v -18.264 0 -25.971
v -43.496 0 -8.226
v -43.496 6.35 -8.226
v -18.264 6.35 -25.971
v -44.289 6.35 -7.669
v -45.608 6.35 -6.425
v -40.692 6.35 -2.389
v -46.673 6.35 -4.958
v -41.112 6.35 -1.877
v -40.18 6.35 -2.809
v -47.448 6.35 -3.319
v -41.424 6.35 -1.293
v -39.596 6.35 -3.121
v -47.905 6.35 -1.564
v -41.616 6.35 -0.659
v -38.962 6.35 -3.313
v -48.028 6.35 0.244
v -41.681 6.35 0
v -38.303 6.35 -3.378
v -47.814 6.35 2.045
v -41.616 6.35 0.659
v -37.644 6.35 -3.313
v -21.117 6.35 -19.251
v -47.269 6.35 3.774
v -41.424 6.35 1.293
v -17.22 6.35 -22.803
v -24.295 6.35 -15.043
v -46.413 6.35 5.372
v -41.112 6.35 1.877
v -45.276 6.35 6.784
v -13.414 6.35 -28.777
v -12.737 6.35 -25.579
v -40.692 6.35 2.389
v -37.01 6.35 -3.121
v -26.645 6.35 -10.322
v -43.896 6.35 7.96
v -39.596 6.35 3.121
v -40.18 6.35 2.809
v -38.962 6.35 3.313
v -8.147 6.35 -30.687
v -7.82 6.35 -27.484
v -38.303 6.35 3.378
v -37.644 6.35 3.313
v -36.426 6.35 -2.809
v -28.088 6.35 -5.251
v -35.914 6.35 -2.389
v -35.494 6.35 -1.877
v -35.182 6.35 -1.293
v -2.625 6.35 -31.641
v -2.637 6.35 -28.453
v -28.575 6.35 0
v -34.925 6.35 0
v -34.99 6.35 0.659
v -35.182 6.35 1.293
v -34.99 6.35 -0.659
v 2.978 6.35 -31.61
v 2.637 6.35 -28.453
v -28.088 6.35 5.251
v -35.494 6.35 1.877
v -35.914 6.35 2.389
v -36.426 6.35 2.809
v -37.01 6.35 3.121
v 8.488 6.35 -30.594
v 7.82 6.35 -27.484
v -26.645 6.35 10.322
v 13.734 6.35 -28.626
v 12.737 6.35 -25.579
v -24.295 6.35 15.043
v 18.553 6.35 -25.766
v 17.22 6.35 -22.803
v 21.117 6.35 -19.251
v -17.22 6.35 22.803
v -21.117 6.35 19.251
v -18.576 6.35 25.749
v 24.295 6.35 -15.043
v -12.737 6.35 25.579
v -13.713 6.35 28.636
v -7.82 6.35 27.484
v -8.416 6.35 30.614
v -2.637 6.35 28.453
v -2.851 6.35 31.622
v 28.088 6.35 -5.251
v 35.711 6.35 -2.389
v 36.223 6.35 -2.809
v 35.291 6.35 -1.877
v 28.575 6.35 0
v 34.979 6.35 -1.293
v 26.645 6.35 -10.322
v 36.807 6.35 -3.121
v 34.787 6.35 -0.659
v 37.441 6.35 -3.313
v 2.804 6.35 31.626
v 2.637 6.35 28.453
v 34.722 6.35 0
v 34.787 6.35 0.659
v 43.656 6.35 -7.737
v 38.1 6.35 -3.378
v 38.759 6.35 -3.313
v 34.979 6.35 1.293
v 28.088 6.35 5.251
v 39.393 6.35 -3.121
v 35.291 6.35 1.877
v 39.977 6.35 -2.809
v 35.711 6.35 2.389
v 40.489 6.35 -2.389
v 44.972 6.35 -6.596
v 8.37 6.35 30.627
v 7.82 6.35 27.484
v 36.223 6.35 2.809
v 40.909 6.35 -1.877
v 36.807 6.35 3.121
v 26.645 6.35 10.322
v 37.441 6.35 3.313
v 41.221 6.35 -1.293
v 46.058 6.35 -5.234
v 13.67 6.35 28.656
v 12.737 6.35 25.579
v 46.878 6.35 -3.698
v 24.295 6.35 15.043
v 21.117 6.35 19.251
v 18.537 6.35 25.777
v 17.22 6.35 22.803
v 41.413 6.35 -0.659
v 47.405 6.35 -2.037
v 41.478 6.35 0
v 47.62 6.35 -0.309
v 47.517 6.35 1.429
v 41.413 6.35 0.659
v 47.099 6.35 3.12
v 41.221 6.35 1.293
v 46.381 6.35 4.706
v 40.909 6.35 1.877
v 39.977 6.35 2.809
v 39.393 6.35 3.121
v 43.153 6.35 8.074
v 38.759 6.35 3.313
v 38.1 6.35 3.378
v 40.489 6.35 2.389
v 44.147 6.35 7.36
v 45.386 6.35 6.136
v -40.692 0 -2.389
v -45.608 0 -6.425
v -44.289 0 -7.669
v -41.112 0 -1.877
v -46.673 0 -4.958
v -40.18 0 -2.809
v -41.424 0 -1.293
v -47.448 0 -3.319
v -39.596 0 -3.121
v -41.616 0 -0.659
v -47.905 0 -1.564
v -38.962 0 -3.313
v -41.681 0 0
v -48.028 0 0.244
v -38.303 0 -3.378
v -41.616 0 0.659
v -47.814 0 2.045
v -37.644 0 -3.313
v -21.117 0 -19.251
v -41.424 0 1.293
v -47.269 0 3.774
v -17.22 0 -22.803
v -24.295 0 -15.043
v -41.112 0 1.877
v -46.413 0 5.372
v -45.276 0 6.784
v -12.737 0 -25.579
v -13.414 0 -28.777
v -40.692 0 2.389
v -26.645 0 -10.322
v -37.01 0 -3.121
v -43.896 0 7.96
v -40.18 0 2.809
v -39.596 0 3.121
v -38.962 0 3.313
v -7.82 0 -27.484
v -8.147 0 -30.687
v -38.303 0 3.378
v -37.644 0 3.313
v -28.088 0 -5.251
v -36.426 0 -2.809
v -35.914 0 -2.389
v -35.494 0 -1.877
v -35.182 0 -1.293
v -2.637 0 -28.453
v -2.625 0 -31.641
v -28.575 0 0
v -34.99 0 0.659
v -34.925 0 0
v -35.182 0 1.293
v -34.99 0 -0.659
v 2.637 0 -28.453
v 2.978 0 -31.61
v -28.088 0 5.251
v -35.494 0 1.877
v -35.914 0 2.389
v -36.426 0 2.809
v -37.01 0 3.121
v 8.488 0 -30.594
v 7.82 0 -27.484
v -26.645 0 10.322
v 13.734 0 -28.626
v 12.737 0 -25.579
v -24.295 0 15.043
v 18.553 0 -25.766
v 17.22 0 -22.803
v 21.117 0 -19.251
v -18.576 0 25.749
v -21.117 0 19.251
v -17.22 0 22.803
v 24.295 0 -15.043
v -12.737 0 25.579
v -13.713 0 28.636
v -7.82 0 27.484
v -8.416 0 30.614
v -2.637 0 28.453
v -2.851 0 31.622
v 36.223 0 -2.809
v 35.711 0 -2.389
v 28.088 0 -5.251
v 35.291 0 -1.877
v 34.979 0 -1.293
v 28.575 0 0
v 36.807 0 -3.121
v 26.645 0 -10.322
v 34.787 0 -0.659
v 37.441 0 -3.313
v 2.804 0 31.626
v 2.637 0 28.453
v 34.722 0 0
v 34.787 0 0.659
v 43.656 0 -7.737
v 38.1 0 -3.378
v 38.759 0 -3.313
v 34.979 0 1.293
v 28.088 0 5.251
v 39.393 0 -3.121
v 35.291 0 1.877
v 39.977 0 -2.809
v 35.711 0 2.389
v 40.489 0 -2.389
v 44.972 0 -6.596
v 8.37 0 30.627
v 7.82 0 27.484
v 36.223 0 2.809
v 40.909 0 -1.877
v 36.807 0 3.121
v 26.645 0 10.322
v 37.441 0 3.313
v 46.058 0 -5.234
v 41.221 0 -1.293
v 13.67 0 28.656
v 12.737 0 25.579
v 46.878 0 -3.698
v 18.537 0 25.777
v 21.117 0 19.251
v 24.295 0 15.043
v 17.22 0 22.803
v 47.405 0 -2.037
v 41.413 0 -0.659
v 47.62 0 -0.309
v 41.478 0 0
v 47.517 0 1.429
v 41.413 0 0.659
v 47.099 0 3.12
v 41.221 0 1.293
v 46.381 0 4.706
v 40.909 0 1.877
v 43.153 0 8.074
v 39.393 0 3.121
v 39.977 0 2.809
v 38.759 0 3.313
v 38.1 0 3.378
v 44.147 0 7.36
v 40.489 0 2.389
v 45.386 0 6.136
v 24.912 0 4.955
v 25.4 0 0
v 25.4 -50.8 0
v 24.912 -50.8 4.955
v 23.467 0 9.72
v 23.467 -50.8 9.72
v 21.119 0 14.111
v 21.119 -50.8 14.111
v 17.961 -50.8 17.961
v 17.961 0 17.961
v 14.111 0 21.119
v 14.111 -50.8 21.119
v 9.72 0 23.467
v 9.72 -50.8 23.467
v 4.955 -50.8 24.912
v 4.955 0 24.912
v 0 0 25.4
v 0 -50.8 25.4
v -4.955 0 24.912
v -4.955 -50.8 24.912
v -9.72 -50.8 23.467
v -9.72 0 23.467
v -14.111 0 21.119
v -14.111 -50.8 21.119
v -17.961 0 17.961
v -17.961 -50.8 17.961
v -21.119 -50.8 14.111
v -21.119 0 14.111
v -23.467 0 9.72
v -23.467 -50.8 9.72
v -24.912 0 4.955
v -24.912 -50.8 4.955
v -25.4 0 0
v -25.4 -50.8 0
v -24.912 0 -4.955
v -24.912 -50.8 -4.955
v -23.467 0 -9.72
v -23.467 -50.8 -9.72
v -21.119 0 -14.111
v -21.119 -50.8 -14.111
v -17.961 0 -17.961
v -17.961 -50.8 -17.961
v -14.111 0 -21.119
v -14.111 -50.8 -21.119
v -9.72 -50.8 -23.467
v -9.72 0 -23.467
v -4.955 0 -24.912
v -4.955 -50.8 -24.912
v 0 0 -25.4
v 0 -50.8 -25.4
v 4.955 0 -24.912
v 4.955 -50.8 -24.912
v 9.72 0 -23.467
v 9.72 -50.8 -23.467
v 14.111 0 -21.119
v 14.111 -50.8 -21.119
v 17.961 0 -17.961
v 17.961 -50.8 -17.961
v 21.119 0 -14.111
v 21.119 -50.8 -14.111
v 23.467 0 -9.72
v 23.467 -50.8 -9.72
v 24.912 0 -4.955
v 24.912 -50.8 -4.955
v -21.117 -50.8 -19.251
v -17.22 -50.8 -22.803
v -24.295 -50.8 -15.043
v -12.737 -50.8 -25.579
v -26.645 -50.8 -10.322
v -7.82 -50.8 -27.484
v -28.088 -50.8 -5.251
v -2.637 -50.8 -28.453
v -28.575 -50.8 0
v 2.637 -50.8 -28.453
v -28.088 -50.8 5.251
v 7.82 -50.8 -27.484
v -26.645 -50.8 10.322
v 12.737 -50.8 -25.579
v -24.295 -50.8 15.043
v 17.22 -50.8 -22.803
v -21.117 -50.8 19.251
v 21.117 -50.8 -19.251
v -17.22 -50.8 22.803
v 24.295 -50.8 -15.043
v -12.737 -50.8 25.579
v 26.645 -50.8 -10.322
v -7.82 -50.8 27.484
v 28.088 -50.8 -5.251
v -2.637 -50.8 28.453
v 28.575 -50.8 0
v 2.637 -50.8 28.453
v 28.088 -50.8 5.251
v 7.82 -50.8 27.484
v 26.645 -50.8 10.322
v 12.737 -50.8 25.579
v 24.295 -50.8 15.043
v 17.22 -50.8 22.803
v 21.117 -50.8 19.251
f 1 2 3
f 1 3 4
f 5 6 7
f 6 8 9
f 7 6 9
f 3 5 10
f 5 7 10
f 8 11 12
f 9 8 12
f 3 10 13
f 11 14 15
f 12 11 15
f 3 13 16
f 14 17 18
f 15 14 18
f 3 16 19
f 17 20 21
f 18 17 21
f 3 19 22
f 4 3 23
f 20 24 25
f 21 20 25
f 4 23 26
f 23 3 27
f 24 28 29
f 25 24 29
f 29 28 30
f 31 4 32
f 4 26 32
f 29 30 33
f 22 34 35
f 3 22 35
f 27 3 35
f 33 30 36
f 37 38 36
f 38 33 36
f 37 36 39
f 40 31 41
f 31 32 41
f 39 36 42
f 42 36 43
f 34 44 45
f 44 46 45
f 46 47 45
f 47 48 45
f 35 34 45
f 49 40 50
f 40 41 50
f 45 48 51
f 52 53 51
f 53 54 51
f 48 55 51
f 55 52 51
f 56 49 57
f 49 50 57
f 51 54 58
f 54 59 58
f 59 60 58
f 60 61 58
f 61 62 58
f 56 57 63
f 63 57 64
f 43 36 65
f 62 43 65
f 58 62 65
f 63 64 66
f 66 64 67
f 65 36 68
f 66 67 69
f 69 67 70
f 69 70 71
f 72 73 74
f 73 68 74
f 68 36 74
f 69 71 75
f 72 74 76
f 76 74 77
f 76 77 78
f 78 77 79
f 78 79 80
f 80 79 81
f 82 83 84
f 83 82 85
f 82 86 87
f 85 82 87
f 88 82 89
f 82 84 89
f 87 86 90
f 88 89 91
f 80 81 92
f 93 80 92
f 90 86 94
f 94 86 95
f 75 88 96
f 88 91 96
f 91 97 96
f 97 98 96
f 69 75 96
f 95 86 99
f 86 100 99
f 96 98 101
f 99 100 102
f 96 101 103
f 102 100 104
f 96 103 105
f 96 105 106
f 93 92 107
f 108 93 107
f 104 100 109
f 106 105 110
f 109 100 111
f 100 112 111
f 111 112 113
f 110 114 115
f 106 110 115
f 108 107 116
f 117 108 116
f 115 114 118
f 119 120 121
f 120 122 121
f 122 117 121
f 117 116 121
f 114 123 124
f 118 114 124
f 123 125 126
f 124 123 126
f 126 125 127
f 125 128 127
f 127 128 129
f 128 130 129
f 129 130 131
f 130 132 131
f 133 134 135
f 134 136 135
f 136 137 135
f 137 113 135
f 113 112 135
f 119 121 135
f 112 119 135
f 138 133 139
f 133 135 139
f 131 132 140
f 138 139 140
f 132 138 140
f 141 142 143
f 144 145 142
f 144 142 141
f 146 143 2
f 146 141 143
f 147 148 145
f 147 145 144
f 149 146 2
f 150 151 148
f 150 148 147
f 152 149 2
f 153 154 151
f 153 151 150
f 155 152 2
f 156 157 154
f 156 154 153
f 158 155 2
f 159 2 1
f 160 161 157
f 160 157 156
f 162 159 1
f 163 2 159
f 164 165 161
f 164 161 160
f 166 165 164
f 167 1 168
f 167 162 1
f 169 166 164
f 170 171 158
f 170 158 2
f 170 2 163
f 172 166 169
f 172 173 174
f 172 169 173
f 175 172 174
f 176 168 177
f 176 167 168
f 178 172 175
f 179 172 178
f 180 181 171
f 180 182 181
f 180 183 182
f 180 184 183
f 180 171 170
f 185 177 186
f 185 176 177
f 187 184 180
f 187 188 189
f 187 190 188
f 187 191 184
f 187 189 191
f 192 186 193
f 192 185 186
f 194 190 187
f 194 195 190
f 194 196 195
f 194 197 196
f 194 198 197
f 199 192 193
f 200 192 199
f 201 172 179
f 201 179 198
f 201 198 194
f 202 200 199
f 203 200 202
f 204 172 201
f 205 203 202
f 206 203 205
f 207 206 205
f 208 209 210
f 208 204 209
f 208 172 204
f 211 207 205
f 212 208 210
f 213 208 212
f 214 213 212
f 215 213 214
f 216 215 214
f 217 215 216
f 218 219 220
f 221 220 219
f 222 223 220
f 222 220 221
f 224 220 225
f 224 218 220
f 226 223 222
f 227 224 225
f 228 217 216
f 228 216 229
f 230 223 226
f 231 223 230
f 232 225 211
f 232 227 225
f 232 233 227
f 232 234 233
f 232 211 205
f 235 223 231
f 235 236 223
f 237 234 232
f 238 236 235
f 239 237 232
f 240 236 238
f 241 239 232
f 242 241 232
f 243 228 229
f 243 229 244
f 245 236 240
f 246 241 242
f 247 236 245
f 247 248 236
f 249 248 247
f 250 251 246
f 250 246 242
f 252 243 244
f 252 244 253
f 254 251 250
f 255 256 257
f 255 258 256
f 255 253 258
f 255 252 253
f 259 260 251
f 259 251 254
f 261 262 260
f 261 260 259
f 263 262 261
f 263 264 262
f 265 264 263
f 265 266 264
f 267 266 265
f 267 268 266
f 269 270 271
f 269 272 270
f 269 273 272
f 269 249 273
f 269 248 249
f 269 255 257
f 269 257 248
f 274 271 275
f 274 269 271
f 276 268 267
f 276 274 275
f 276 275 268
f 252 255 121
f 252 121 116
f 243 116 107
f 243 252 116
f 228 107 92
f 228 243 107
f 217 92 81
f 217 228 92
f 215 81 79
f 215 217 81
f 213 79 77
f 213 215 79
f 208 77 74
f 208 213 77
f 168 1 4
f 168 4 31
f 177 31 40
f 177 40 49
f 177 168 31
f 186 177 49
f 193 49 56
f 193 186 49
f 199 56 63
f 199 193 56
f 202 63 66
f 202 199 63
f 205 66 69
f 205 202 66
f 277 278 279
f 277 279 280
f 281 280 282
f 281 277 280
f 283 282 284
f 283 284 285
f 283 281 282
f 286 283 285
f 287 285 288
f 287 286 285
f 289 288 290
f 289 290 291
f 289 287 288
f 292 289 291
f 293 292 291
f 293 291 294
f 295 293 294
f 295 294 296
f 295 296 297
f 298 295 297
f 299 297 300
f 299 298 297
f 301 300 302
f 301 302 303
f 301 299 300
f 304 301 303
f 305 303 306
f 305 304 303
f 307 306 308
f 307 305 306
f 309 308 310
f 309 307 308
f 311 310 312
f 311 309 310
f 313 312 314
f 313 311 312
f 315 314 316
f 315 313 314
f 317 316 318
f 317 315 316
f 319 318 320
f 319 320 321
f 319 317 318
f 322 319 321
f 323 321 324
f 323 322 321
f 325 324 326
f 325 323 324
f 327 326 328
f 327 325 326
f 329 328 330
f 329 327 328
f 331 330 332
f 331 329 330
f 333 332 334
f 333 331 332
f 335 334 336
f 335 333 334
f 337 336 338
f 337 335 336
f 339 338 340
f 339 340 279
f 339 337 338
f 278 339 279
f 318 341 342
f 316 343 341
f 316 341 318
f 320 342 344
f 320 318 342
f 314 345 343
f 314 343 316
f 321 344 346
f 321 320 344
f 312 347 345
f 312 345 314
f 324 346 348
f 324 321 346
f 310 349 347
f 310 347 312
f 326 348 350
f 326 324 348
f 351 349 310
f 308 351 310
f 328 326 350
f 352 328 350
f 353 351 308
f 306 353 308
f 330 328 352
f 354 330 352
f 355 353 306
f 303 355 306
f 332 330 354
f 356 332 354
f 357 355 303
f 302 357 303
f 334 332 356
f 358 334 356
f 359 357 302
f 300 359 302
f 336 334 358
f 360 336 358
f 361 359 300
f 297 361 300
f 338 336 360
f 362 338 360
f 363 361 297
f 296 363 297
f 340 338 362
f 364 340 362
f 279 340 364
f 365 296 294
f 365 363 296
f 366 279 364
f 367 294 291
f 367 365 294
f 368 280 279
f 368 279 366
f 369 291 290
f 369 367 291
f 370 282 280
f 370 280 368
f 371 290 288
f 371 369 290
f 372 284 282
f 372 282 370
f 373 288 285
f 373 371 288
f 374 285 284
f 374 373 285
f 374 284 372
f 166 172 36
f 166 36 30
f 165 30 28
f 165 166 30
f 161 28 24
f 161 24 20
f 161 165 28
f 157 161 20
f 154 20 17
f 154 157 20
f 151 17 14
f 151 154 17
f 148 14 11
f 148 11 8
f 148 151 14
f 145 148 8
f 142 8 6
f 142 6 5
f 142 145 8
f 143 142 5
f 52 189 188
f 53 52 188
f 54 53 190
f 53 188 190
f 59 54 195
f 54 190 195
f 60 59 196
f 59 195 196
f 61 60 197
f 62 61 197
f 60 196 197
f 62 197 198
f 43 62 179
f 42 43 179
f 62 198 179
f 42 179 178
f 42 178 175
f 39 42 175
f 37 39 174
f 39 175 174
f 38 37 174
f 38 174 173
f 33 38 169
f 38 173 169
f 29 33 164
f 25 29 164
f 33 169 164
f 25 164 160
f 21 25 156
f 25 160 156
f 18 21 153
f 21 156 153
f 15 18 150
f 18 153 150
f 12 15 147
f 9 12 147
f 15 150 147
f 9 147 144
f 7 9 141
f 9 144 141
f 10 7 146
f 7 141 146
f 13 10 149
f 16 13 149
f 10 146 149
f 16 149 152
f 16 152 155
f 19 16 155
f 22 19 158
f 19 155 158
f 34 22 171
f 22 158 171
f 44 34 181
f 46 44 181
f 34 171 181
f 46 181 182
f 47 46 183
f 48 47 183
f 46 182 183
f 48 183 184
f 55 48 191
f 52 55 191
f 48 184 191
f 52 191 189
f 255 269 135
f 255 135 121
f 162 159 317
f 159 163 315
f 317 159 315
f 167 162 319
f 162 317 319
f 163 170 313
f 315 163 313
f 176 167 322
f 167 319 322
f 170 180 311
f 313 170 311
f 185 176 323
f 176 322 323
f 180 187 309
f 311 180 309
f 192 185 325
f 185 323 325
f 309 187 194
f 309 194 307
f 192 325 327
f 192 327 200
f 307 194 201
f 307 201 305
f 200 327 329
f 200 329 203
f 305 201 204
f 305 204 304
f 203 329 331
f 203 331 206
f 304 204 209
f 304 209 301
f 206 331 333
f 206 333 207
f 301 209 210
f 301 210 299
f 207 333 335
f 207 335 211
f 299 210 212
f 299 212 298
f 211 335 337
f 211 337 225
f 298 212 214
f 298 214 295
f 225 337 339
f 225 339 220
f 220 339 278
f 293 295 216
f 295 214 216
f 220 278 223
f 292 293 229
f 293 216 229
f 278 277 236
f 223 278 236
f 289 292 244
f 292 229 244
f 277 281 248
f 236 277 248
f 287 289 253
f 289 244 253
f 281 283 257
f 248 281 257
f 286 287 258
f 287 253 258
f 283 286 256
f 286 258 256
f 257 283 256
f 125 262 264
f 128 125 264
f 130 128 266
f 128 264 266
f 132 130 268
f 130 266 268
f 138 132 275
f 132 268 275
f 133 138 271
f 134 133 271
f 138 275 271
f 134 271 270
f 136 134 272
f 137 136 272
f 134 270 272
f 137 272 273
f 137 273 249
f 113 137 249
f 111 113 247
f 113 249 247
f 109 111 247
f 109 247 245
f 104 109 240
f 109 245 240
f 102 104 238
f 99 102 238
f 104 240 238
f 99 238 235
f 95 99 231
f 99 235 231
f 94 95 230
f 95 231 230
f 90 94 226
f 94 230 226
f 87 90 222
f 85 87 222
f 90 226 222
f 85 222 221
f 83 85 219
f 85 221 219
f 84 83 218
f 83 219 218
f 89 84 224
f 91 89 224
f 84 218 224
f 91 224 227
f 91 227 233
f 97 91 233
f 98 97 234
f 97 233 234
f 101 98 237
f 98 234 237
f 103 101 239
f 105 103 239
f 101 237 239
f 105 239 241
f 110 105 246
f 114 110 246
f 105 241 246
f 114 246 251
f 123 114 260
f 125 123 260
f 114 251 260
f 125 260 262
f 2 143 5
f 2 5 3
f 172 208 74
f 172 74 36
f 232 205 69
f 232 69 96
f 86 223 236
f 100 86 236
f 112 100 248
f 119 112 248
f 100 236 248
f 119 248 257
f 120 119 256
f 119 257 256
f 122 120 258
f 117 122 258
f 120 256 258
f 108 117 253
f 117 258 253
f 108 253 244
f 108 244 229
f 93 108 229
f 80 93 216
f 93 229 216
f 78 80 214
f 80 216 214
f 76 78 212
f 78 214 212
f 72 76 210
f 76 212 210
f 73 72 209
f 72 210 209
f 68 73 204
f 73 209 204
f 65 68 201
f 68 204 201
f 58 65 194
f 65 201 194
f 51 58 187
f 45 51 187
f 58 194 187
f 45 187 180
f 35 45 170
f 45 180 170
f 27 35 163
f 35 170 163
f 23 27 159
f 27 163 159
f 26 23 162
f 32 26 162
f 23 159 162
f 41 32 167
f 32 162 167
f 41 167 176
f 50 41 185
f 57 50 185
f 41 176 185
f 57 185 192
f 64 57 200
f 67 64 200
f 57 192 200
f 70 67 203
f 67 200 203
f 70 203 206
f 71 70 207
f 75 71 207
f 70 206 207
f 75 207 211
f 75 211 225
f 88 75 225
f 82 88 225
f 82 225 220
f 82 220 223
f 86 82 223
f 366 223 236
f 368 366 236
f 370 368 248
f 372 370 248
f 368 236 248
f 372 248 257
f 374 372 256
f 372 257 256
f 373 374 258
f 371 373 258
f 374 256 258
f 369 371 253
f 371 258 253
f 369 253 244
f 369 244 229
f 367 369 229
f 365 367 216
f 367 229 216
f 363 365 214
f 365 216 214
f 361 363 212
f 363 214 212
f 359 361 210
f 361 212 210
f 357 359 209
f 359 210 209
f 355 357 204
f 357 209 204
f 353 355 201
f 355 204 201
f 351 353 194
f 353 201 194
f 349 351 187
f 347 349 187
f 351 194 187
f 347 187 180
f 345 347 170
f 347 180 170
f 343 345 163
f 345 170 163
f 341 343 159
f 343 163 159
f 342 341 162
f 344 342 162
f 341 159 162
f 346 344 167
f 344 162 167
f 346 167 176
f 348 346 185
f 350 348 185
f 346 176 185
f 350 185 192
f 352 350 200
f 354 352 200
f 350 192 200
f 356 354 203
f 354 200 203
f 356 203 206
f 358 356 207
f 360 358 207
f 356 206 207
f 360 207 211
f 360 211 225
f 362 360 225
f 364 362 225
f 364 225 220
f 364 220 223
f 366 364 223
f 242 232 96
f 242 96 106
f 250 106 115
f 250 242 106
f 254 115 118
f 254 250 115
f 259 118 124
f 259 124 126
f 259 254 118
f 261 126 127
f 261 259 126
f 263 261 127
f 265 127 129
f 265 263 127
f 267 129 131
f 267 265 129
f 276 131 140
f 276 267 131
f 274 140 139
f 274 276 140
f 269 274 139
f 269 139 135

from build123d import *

# Parameters (mm, degrees)
F0_R     = 3.3782
F0_R_2   = 28.575
F1_DEPTH = 6.35
F2_R     = 28.575
F2_R_2   = 25.4
F3_DEPTH = 50.8


with BuildPart() as f1:
    # F0 (on Front) → F1 (new body)
    with BuildSketch(Plane.XZ):
        with BuildLine():
            Line((-43.496225, -8.2262), (-18.264144, -25.970821))
            ThreePointArc((-18.264144, -25.970821), (0.177032, -31.749506), (18.552621, -25.765535))
            Line((18.552621, -25.765535), (43.656244, -7.736522))
            ThreePointArc((43.656244, -7.736522), (47.619978, -0.30927), (44.146663, 7.359585))
            Line((44.146663, 7.359585), (43.152689, 8.074402))
            Line((43.152689, 8.074402), (18.537243, 25.7766))
            ThreePointArc((18.537243, 25.7766), (-0.023698, 31.749991), (-18.575701, 25.7489))
            Line((-18.575701, 25.7489), (-43.895639, 7.960057))
            ThreePointArc((-43.895639, 7.960057), (-48.028327, 0.244496), (-44.288563, -7.668983))
            Line((-44.288563, -7.668983), (-43.496225, -8.2262))
        make_face()
        with Locations((-38.3032, 0)):
            Circle(F0_R, mode=Mode.SUBTRACT)
        Circle(F0_R_2, mode=Mode.SUBTRACT)
        with Locations((38.1, 0)):
            Circle(F0_R, mode=Mode.SUBTRACT)
    extrude(amount=-F1_DEPTH)


with BuildPart() as f3:
    # F2 (on Front) → F3 (new body)
    with BuildSketch(Plane.XZ):
        Circle(F2_R)
        Circle(F2_R_2, mode=Mode.SUBTRACT)
    extrude(amount=F3_DEPTH)


solid = Compound([f1.part, f3.part])
